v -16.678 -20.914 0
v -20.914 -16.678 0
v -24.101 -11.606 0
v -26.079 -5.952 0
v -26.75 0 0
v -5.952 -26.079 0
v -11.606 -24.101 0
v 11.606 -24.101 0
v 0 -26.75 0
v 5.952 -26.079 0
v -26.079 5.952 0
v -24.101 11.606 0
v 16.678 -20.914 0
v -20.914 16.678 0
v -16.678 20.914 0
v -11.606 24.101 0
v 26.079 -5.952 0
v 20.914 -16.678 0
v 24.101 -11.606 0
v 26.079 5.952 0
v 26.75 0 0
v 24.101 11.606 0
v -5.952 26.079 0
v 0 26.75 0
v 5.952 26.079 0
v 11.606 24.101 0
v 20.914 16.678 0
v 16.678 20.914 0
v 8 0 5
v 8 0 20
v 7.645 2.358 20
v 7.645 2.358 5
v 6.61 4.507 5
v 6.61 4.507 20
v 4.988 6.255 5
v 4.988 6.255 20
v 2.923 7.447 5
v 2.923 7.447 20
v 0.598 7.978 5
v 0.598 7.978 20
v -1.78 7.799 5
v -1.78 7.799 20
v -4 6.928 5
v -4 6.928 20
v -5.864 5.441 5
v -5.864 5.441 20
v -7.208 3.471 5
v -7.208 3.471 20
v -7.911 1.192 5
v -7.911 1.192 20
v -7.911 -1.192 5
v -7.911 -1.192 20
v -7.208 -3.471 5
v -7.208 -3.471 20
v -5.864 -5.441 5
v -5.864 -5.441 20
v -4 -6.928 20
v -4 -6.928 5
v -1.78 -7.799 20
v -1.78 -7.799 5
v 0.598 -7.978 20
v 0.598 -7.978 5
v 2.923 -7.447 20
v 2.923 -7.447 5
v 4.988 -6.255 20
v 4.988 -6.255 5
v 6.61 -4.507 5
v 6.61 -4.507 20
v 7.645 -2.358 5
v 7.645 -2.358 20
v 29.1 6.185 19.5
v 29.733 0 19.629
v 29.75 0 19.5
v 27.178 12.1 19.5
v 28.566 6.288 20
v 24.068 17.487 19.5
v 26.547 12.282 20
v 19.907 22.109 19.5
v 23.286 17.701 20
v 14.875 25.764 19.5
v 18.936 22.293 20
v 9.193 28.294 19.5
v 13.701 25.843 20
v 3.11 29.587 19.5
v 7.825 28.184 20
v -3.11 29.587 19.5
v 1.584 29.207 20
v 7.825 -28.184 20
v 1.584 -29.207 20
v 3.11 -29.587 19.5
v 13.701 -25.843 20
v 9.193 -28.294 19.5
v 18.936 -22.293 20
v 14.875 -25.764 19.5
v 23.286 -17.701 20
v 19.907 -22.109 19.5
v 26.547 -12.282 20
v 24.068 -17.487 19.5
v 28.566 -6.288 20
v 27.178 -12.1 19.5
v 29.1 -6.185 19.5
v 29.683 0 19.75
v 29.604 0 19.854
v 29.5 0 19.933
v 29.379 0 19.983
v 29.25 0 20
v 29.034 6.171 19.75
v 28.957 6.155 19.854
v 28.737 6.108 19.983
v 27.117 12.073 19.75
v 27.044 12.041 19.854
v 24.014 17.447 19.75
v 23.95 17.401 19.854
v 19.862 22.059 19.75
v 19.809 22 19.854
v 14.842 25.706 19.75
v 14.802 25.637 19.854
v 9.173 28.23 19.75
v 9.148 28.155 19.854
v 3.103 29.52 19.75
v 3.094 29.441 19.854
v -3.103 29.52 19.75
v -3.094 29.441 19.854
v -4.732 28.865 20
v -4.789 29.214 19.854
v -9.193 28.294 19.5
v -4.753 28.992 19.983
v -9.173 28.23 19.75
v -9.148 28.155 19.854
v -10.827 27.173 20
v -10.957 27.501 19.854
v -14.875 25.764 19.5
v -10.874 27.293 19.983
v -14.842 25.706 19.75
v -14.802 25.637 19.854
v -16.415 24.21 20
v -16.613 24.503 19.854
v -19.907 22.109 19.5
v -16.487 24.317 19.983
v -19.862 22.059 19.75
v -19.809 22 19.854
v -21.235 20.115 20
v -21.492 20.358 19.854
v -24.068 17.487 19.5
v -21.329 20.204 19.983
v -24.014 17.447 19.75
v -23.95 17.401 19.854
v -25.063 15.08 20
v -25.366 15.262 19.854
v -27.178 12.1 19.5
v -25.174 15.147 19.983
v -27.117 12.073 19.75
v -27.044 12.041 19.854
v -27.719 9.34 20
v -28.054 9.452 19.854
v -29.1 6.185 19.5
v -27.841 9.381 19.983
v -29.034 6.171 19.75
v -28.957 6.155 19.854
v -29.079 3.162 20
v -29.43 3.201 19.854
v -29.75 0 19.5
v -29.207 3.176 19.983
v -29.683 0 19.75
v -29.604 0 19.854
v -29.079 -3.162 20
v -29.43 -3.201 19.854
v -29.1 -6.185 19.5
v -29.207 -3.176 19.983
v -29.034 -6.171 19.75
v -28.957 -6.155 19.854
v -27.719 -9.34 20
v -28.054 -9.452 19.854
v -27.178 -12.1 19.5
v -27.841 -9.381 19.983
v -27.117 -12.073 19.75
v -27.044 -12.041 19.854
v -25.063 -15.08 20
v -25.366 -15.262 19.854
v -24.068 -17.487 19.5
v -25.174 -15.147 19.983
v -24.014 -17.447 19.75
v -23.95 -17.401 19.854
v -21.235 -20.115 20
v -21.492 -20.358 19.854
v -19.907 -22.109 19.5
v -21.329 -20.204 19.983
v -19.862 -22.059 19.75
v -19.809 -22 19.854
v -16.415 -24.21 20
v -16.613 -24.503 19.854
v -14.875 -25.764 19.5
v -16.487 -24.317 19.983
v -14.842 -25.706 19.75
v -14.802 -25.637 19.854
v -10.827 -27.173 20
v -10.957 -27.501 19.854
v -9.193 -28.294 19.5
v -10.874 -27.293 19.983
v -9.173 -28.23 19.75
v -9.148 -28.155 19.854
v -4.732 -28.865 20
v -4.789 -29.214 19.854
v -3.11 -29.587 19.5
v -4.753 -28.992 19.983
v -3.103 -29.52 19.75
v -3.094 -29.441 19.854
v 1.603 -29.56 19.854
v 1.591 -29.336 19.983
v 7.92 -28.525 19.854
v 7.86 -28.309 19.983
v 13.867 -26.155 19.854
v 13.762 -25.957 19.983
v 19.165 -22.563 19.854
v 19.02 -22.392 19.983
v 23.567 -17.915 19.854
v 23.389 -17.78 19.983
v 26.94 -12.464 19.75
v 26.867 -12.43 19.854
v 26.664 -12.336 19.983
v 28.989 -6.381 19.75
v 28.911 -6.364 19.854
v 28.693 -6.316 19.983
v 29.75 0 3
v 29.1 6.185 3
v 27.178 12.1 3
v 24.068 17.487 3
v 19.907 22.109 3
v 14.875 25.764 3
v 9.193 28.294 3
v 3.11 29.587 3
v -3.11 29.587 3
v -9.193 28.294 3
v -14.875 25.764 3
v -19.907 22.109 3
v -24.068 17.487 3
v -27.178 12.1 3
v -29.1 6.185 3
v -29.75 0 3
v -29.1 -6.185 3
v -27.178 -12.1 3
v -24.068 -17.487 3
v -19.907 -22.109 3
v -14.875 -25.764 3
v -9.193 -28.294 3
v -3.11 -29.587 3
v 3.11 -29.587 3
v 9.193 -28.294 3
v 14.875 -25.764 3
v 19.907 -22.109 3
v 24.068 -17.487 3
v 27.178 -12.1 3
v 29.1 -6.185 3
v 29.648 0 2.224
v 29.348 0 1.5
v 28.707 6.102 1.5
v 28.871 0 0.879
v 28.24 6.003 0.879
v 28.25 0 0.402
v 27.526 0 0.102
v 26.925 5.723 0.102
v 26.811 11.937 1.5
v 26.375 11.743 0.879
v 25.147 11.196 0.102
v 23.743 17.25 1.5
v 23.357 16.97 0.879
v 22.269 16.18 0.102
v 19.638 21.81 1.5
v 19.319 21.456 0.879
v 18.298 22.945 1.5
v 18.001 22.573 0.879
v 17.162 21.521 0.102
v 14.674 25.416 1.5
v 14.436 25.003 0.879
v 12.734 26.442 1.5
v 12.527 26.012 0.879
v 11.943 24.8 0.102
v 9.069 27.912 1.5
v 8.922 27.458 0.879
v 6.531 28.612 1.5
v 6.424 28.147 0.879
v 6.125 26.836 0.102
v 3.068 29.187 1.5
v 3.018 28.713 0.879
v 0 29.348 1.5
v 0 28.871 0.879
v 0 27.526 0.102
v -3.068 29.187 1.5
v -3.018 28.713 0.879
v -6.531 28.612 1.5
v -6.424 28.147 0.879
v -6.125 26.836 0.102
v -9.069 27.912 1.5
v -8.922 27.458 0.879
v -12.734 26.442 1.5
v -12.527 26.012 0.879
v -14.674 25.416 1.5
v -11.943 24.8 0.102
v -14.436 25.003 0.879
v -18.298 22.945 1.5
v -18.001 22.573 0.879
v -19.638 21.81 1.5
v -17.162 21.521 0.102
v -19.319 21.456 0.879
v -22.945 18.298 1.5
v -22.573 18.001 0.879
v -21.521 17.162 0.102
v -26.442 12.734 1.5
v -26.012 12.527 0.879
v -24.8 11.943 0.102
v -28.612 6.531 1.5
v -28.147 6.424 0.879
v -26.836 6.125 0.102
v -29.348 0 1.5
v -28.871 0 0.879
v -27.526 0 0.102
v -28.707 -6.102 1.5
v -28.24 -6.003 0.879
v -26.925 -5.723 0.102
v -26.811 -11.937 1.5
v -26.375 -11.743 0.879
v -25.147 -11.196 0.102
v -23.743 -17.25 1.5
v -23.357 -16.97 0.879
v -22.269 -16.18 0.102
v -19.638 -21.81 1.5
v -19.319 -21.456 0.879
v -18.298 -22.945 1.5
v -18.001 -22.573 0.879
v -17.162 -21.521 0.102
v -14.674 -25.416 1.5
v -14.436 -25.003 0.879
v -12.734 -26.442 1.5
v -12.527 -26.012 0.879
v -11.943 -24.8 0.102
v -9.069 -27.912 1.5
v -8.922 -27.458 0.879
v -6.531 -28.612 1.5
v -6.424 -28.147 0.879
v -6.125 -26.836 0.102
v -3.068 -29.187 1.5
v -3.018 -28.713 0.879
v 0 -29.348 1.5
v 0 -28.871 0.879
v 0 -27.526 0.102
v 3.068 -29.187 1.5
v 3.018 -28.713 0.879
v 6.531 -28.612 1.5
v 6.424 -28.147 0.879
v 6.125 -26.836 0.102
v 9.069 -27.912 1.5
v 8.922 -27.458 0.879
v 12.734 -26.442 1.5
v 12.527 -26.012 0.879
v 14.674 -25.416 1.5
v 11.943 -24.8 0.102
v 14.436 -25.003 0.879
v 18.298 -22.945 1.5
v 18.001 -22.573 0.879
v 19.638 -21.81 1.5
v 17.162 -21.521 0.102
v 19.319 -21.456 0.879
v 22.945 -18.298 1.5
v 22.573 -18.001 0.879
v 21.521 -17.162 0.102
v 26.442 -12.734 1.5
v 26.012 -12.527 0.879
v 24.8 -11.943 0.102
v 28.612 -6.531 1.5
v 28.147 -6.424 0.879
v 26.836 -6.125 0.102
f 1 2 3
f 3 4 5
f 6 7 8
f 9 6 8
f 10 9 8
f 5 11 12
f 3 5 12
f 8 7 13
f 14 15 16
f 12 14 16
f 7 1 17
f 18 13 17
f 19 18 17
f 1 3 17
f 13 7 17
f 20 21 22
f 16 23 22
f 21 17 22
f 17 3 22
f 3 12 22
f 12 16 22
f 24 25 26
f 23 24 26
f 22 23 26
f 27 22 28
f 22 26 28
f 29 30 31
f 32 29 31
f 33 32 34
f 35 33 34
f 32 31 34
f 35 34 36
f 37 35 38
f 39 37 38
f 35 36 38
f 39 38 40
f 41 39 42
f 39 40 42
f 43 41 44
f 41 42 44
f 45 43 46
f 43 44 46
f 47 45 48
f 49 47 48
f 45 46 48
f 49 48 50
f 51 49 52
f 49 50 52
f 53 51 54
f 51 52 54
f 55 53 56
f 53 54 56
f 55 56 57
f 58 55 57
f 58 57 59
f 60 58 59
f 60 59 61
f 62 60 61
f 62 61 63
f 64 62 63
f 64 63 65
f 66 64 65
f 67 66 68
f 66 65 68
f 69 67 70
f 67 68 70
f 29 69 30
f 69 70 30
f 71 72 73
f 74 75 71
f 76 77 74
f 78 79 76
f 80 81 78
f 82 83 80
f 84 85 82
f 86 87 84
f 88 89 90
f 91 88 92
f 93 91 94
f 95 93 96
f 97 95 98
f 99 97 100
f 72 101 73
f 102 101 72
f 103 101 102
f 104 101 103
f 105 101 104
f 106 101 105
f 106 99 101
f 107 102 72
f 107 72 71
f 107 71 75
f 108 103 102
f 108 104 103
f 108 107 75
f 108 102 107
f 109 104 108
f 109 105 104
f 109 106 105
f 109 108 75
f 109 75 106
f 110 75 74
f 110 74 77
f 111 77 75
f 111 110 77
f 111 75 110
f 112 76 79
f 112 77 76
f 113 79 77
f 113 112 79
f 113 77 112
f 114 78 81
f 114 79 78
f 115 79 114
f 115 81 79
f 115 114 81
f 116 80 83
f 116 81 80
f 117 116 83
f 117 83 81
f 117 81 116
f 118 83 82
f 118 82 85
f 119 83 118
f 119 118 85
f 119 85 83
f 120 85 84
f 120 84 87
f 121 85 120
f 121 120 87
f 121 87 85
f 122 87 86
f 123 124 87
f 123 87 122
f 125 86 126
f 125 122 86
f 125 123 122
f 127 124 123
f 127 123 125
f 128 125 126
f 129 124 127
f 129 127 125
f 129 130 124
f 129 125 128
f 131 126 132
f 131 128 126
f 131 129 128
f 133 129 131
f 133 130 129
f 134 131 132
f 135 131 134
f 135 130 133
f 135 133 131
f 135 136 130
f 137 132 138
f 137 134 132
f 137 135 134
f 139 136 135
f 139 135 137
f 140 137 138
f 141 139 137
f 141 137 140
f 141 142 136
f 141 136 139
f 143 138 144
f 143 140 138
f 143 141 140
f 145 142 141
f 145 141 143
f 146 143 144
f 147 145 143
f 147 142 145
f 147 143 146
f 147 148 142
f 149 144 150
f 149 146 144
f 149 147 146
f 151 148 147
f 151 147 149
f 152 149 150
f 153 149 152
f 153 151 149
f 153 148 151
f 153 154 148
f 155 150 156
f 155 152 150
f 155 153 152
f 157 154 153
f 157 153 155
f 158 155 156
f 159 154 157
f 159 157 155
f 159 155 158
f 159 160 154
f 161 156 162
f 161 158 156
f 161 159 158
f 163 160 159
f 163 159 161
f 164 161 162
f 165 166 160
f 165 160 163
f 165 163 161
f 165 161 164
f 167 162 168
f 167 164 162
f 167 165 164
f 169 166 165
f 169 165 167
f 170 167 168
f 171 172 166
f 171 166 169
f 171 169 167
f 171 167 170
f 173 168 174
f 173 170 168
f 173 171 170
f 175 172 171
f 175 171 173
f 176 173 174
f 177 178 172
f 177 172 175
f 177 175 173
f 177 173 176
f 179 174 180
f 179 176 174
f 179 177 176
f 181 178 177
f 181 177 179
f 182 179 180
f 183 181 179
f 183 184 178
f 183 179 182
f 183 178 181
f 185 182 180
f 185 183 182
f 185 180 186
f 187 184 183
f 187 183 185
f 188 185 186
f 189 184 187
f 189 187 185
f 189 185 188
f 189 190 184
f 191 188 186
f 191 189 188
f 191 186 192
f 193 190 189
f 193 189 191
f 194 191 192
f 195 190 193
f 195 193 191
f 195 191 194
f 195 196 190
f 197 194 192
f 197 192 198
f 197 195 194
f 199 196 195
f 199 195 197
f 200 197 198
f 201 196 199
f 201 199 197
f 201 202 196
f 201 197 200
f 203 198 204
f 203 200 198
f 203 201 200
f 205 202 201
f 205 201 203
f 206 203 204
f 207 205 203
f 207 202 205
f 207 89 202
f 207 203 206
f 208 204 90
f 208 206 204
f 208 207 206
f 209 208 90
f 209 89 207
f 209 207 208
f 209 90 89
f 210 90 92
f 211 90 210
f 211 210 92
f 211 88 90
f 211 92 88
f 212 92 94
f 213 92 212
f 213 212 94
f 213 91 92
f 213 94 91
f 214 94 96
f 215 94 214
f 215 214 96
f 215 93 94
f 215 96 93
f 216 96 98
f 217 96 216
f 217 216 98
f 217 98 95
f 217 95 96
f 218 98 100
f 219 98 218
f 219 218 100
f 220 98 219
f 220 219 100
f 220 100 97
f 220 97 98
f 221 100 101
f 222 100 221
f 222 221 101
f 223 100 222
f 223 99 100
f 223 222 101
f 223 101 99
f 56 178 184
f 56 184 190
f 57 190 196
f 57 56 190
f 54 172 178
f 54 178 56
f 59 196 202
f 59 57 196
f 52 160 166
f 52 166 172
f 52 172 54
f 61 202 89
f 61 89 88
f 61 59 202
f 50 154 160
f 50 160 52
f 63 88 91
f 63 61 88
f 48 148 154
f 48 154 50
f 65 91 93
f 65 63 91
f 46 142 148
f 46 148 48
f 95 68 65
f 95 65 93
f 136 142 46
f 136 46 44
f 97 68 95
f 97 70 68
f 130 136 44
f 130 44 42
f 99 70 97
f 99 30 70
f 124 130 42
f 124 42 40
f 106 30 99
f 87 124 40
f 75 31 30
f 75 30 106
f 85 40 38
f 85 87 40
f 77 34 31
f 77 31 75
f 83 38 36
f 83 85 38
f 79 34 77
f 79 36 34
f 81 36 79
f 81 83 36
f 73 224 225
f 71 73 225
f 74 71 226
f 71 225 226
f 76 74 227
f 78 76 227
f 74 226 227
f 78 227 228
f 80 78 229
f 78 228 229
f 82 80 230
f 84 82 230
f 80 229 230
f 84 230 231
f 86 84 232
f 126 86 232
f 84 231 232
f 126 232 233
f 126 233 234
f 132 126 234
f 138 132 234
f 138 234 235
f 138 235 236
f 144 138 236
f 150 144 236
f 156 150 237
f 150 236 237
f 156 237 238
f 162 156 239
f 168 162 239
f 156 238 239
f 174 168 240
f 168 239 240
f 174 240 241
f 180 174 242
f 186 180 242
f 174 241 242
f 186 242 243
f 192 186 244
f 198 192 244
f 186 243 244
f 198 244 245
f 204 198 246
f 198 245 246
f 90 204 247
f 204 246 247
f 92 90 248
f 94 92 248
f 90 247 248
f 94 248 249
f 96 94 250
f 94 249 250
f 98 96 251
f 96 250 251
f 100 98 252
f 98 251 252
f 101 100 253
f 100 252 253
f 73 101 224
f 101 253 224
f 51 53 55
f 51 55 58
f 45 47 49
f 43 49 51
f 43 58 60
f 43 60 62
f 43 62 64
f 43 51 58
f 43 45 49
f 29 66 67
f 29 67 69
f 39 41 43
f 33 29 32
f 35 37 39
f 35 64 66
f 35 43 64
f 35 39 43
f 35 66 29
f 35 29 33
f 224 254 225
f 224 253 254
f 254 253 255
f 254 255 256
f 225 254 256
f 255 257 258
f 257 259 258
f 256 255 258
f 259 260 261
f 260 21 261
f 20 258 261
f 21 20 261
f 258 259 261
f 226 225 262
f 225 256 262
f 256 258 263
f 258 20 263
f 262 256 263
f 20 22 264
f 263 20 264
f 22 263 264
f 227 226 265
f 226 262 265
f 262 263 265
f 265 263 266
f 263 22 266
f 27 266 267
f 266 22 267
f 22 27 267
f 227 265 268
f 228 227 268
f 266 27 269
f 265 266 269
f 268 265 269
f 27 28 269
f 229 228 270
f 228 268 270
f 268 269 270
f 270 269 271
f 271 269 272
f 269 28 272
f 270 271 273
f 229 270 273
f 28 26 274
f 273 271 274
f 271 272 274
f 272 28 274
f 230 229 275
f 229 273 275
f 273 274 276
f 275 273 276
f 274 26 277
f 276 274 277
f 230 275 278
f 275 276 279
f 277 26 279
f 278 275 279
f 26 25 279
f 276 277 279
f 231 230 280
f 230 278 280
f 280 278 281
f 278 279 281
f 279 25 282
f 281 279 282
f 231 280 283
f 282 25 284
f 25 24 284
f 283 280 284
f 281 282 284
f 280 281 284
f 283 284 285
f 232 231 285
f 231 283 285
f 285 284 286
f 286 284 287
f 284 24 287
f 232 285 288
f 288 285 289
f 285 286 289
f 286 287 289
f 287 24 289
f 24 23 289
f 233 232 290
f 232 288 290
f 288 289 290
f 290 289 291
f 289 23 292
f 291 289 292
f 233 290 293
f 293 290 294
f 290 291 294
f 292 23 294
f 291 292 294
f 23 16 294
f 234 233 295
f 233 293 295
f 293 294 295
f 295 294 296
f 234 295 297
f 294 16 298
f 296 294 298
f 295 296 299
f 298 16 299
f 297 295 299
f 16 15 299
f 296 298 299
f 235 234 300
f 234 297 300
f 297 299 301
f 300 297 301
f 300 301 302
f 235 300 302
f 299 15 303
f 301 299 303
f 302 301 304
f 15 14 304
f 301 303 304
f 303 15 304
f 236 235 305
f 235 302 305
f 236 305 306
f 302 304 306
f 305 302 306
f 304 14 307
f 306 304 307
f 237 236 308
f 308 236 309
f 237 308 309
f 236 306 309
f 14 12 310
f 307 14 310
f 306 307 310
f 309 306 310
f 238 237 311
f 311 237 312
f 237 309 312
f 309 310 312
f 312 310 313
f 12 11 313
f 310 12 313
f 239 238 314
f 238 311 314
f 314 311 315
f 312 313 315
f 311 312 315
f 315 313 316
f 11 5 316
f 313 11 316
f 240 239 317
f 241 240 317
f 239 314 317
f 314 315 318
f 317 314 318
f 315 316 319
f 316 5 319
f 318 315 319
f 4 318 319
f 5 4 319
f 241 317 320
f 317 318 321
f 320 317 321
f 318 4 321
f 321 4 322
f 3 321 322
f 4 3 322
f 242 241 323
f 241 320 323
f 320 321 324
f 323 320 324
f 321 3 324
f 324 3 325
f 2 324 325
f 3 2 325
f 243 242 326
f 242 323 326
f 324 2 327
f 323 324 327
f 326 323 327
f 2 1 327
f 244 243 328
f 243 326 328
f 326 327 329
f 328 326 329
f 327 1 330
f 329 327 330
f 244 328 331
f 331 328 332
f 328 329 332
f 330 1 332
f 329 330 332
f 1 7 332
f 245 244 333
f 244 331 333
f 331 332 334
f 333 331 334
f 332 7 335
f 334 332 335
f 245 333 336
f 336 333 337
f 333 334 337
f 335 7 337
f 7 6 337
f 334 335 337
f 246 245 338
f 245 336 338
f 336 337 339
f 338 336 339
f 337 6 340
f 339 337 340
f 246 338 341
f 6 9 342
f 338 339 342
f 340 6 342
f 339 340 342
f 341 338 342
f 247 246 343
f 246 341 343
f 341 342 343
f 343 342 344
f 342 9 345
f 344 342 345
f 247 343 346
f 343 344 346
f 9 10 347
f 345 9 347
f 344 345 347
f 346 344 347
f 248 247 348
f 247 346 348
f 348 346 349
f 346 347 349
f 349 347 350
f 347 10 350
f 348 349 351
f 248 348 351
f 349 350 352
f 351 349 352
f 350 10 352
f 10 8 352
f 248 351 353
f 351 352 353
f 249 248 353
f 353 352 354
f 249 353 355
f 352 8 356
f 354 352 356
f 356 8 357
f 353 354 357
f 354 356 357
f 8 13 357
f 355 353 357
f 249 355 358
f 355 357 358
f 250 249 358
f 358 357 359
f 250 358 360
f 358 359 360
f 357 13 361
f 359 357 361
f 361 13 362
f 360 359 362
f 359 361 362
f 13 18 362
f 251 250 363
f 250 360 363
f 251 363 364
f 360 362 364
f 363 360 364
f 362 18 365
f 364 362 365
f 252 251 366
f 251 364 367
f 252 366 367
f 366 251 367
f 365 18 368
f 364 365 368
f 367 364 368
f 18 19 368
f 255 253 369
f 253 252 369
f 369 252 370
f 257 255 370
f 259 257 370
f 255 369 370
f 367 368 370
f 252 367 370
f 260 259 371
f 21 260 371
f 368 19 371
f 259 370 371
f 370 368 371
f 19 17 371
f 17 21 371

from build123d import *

# Parameters (mm, degrees)
F0_R     = 29.75
F1_DEPTH = 20
F2_R     = 8
F3_DEPTH = 15
F4_R     = 0.5
F5_R     = 3


with BuildPart() as f1:
    # F0 (on Top) → F1 (new body)
    with BuildSketch(Plane.XY):
        Circle(F0_R)
    extrude(amount=F1_DEPTH)

    # F2 (on face) → F3 (cut)
    with BuildSketch(Plane.XY.offset(20)):
        Circle(F2_R)
    extrude(amount=-F3_DEPTH, mode=Mode.SUBTRACT)

    # F4
    f4_edges = [f1.edges().sort_by_distance(p)[0] for p in [
        (-29.75, 0, 20),
    ]]
    fillet(f4_edges, radius=F4_R)

    # F5
    f5_edges = [f1.edges().sort_by_distance(p)[0] for p in [
        (-29.75, 0, 0),
    ]]
    fillet(f5_edges, radius=F5_R)


solid = f1.part
